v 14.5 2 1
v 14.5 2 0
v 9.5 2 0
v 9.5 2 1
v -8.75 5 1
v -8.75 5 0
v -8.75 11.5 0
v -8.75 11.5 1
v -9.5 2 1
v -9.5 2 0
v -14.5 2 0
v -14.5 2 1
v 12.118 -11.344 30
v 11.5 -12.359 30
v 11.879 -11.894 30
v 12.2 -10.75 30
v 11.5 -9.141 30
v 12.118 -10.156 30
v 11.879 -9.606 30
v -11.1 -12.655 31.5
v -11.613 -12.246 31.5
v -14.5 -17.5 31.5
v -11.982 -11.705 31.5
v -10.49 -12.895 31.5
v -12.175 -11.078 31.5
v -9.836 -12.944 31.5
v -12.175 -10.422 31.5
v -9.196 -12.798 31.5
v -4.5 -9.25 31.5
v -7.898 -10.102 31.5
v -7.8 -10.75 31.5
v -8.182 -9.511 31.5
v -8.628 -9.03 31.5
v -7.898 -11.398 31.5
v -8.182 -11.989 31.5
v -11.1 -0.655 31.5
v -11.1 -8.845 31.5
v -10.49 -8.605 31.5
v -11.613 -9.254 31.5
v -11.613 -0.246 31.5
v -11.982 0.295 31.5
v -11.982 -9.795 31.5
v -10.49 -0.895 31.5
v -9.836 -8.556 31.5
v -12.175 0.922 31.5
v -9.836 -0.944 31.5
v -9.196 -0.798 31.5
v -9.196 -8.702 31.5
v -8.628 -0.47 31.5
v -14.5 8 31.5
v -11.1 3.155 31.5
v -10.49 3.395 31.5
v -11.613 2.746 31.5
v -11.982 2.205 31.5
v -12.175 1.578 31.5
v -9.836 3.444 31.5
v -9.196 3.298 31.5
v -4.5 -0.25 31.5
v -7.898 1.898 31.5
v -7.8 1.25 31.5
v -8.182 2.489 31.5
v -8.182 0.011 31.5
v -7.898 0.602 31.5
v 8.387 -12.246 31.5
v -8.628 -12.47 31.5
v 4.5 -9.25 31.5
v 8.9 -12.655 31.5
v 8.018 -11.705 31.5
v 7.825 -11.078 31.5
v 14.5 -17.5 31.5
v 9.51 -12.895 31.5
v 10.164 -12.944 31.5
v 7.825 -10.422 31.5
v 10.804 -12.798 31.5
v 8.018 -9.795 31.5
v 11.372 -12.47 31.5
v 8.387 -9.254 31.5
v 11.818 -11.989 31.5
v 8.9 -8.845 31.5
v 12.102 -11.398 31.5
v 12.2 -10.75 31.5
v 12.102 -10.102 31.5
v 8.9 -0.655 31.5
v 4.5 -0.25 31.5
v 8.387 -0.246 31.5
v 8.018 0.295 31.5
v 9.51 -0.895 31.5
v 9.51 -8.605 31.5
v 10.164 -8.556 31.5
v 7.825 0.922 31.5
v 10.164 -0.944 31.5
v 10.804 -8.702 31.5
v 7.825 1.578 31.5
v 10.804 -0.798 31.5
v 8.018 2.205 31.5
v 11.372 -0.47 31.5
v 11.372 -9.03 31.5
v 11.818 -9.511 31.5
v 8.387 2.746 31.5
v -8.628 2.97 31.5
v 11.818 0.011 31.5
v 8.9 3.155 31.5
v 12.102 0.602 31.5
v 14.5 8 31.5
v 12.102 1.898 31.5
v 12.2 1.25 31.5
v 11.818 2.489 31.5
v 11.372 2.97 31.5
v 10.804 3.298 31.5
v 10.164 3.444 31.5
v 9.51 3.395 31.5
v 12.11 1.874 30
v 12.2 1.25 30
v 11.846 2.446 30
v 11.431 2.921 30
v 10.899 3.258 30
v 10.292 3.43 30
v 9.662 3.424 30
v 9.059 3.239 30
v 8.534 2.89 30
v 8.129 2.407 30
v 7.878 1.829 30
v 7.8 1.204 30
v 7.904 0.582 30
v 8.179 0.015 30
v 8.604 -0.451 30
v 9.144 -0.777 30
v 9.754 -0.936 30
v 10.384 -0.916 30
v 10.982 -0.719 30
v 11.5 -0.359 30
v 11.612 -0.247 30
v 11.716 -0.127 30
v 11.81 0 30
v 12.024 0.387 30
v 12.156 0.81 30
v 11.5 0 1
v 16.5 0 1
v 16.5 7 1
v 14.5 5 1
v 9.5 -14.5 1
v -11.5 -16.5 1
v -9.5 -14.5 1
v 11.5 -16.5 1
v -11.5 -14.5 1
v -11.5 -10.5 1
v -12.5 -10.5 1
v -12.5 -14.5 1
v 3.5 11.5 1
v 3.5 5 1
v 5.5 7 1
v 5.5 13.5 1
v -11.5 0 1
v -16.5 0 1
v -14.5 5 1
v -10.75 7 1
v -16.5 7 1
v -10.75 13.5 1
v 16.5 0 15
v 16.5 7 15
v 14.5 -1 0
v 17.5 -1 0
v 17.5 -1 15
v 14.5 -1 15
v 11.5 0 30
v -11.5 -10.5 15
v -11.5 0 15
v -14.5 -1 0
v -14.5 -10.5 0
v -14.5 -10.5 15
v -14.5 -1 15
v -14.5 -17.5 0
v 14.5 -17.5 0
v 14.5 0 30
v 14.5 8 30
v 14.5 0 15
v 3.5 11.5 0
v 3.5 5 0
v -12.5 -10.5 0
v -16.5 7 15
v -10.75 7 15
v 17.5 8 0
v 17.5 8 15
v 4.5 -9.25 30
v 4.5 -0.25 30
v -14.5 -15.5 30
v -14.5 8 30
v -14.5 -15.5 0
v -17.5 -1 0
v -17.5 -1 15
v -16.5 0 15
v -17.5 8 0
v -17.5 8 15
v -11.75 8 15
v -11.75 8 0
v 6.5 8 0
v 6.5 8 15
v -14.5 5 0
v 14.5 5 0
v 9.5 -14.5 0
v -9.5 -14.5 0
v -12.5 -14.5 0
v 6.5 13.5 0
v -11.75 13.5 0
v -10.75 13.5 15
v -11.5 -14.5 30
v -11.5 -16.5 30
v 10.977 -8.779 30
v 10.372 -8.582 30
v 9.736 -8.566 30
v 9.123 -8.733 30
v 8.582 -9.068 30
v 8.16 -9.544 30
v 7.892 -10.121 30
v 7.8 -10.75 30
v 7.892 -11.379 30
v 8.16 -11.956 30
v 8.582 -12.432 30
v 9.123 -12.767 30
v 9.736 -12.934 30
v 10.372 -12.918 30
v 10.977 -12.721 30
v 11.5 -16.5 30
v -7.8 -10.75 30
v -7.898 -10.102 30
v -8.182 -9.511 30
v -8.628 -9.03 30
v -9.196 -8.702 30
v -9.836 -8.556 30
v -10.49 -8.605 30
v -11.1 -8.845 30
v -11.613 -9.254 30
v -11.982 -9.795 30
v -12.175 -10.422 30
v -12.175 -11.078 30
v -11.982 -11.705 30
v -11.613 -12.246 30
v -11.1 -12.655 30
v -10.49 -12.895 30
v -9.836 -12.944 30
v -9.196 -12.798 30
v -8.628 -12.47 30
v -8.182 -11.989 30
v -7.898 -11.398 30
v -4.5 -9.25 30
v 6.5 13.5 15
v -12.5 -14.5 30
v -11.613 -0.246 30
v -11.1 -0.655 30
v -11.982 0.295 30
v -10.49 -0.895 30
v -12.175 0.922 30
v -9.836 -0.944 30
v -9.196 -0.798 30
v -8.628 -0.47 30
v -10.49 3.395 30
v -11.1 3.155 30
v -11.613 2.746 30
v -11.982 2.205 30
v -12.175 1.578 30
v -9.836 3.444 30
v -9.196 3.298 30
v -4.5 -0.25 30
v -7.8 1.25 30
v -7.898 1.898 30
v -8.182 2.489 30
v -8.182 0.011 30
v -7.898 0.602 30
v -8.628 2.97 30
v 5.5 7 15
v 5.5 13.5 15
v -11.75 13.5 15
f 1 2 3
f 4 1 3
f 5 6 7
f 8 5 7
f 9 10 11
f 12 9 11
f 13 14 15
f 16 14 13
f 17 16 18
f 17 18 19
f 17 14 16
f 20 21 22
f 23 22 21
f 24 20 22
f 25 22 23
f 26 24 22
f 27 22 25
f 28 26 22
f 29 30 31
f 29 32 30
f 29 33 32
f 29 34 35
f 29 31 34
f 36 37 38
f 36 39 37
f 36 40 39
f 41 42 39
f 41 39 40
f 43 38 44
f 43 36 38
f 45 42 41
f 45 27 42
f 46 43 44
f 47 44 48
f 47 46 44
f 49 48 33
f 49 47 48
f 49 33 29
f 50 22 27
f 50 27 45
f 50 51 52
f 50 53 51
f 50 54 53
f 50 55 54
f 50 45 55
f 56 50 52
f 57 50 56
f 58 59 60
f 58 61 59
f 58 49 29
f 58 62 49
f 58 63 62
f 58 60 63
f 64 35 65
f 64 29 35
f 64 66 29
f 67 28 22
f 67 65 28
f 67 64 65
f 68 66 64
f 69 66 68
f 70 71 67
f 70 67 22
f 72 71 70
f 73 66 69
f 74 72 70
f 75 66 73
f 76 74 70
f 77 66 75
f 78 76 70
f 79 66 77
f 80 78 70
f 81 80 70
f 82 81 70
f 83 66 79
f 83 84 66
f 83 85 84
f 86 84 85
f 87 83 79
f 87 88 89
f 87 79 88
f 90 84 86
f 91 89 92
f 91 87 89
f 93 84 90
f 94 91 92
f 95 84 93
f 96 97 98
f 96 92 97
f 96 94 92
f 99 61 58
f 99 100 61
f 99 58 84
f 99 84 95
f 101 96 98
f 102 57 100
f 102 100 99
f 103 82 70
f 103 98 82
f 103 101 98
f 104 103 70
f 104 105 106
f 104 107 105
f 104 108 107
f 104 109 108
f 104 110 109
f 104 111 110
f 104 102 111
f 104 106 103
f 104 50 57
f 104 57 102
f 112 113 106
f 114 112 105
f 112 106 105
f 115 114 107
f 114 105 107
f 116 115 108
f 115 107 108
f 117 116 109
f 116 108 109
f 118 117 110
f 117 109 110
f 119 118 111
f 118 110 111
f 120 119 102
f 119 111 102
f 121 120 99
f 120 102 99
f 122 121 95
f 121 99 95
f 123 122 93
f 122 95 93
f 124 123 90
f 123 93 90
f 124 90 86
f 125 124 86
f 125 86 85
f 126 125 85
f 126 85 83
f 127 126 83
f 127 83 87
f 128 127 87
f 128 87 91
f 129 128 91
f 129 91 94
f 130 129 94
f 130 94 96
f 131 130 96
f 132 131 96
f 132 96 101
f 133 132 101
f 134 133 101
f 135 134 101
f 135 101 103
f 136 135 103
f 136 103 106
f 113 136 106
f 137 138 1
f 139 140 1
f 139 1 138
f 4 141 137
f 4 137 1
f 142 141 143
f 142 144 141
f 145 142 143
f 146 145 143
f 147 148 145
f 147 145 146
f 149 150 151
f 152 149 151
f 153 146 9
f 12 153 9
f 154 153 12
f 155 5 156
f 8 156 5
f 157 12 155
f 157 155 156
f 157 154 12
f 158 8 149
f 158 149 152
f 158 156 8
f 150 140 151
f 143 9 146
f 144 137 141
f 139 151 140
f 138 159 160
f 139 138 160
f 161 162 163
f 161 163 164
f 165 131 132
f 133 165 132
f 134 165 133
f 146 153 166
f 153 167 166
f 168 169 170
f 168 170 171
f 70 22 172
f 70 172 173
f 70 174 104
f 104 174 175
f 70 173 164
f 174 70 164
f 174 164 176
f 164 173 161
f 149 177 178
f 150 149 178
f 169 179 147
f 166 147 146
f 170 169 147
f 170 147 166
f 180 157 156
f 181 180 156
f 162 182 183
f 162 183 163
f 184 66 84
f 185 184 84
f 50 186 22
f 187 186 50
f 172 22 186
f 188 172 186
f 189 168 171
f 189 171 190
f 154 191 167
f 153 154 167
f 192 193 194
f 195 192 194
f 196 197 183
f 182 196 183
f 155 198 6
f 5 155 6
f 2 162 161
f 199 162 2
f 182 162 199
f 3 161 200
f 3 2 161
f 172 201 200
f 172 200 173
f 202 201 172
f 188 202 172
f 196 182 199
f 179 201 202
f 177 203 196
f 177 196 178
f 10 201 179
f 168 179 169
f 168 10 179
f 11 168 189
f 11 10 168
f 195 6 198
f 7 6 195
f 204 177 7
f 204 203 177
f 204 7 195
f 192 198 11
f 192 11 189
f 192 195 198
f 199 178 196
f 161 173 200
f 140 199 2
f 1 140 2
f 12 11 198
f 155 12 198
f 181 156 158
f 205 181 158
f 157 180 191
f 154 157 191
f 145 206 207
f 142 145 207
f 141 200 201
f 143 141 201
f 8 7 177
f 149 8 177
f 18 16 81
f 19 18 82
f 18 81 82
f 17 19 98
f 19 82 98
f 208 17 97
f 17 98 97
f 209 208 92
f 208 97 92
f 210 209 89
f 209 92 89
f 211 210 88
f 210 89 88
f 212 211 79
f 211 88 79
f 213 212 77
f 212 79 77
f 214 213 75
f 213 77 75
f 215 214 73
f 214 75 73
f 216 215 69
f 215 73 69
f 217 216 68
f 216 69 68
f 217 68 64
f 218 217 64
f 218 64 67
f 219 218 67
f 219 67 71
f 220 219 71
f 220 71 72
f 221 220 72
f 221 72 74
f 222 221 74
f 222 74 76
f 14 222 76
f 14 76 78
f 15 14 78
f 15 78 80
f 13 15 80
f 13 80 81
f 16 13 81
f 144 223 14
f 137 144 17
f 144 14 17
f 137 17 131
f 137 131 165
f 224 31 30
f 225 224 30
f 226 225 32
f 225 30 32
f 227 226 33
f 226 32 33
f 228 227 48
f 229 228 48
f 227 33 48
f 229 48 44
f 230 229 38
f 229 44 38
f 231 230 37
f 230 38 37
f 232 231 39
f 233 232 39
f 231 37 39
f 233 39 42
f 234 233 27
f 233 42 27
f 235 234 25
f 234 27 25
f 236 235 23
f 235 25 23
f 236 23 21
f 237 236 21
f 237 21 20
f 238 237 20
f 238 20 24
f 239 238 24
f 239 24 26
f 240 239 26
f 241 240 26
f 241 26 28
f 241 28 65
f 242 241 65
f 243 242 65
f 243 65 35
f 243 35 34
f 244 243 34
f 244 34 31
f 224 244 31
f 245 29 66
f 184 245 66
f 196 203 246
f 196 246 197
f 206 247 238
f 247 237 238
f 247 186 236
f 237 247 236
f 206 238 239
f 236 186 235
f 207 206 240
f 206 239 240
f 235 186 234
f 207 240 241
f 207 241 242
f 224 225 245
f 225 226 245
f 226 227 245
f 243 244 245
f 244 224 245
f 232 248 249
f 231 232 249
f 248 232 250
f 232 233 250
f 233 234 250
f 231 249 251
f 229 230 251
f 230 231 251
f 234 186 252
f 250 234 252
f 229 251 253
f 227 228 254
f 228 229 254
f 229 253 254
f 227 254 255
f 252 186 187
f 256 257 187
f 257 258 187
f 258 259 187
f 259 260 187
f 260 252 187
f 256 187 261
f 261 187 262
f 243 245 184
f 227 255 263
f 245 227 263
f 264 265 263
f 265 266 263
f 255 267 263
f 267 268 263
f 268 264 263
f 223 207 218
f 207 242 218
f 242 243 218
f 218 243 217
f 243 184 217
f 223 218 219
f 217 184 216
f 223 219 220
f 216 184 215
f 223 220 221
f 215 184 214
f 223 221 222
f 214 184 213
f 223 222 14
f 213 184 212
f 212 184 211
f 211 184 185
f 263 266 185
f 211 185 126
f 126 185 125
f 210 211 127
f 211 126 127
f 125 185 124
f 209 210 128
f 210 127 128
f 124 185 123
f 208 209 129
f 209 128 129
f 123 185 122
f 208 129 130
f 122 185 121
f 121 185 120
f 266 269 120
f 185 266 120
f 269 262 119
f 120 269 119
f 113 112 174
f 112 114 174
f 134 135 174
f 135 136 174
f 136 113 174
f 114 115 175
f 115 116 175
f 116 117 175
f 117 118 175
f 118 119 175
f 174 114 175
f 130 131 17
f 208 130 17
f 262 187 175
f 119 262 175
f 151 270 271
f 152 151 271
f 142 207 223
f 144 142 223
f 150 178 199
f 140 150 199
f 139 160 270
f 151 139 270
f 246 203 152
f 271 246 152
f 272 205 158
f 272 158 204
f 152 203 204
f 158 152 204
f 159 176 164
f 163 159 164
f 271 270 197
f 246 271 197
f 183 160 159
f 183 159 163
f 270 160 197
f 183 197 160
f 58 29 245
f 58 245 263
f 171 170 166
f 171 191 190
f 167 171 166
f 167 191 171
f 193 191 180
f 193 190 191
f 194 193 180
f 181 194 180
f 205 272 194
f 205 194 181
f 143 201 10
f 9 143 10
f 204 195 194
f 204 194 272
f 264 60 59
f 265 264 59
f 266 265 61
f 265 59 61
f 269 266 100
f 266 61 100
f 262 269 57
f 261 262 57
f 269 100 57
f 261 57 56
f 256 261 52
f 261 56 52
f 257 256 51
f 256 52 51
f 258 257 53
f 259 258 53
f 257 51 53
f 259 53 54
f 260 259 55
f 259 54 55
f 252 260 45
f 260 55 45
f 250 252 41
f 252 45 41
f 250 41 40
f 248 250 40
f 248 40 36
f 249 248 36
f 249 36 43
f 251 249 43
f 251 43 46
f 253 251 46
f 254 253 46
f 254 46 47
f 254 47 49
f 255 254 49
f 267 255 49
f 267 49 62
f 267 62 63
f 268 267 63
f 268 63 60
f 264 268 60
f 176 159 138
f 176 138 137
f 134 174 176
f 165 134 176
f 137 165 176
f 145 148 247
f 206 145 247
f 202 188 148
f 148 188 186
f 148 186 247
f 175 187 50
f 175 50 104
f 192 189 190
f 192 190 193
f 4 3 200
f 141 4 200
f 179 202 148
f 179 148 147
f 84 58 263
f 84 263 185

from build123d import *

# Parameters (mm, degrees)
EXTRUDE_1_DEPTH        = 15
CUT_EXTRUDE_1_DEPTH    = 14
SKETCH_7_W             = 46
SKETCH_7_H             = 6
CUT_EXTRUDE_2_DEPTH    = 1
SKETCH_8_W             = 14
SKETCH_8_H             = 4
CUT_EXTRUDE_3_DEPTH    = 1
CUT_EXTRUDE_6_DEPTH    = 1
EXTRUDE_START          = -30
EXTRUDE_10_OUTLINE_W   = 3
EXTRUDE_10_OUTLINE_H   = 17.5
EXTRUDE_10_OUTLINE_H_2 = 10.5
EXTRUDE_10_OUTLINE_W_2 = 9
EXTRUDE_10_OUTLINE_H_3 = 1
EXTRUDE_10_OUTLINE_W_3 = 2
EXTRUDE_10_DEPTH       = 30
SKETCH_29_W            = 29
SKETCH_29_H            = 25.5
EXTRUDE_12_DEPTH       = 1.5
SKETCH_30_R            = 2.2
SKETCH_30_W            = 9
SKETCH_30_H            = 9
CUT_EXTRUDE_8_DEPTH    = 1.5
SKETCH_31_W            = 1.75
SKETCH_31_H            = 1
EXTRUDE_13_DEPTH       = 15
SKETCH_33_W            = 9
SKETCH_33_H            = 1
SKETCH_33_W_2          = 3.75
CUT_EXTRUDE_9_DEPTH    = 15
SKETCH_38_W            = 3
SKETCH_38_H            = 10.5
CUT_EXTRUDE_11_DEPTH   = 15
SKETCH_39_W            = 29
SKETCH_39_H            = 1
EXTRUDE_14_DEPTH       = 30
SKETCH_40_W            = 48
SKETCH_40_H            = 8
CUT_EXTRUDE_12_DEPTH   = 15


# Read off the part's stored shape, not the designer's step: 凸台-拉伸10
with BuildPart() as part:
    # 草图3 → 凸台-拉伸1 (new body)
    with BuildSketch(Plane.XY):
        Polygon((-25, 21.5), (23, 21.5), (23, 13.5), (6.5, 13.5), (6.5, 8), (17.5, 8), (17.5, -1), (12.5, -1), (12.5, -17.5), (-12.5, -17.5), (-12.5, -1), (-17.5, -1), (-17.5, 8), (-11.75, 8), (-11.75, 13.5), (-25, 13.5), align=None)
    extrude(amount=EXTRUDE_1_DEPTH)

    # 草图4 → 切除-拉伸1 (cut)
    with BuildSketch(Plane.XY.offset(15)):
        Polygon((22, 20.5), (-24, 20.5), (-24, 14.5), (-10.75, 14.5), (-10.75, 7), (-16.5, 7), (-16.5, 0), (-11.5, 0), (-11.5, -16.5), (11.5, -16.5), (11.5, 0), (16.5, 0), (16.5, 7), (5.5, 7), (5.5, 14.5), (22, 14.5), align=None)
    extrude(amount=-CUT_EXTRUDE_1_DEPTH, mode=Mode.SUBTRACT)

    # 草图7 → 切除-拉伸2 (cut)
    with BuildSketch(Plane.XY.offset(1)):
        with Locations((-1, 17.5)):
            Rectangle(SKETCH_7_W, SKETCH_7_H)
    extrude(amount=-CUT_EXTRUDE_2_DEPTH, mode=Mode.SUBTRACT)

    # 草图8 → 切除-拉伸3 (cut)
    with BuildSketch(Plane.ZY.offset(12.5)):
        with Locations((8, -12.5)):
            Rectangle(SKETCH_8_W, SKETCH_8_H)
    extrude(amount=-CUT_EXTRUDE_3_DEPTH, mode=Mode.SUBTRACT)

    # 草图9 → 切除-拉伸6 (cut)
    with BuildSketch(Plane(origin=(0, 0, 0), x_dir=(-1, 0, 0), z_dir=(0, 0, -1))):
        Polygon((-3.5, 11.5), (-3.5, 5), (-14.5, 5), (-14.5, 2), (-9.5, 2), (-9.5, -14.5), (9.5, -14.5), (9.5, 2), (14.5, 2), (14.5, 5), (8.75, 5), (8.75, 11.5), align=None)
    extrude(amount=-CUT_EXTRUDE_6_DEPTH, mode=Mode.SUBTRACT)

    # 凸台-拉伸10 outline → 凸台-拉伸10 (add)
    with BuildSketch(Plane(origin=(0, 0, 0), x_dir=(-1, 0, 0), z_dir=(0, 0, -1)).offset(EXTRUDE_START)):
        with Locations((-13, -8.75)):
            Rectangle(EXTRUDE_10_OUTLINE_W, EXTRUDE_10_OUTLINE_H)
        Polygon((14.5, -15.5), (12.5, -14.5), (11.5, -14.5), (11.5, -17.5), (14.5, -17.5), align=None)
        with Locations((13, -5.25)):
            Rectangle(EXTRUDE_10_OUTLINE_W, EXTRUDE_10_OUTLINE_H_2)
        with Locations((-10, 7.5)):
            Rectangle(EXTRUDE_10_OUTLINE_W_2, EXTRUDE_10_OUTLINE_H_3)
        with Locations((13.5, 7.5)):
            Rectangle(EXTRUDE_10_OUTLINE_W_3, EXTRUDE_10_OUTLINE_H_3)
    extrude(amount=EXTRUDE_10_DEPTH)

    # 草图29 → 凸台-拉伸12 (add)
    with BuildSketch(Plane.XY.offset(30)):
        with Locations((0, -4.75)):
            Rectangle(SKETCH_29_W, SKETCH_29_H)
    extrude(amount=EXTRUDE_12_DEPTH)

    # 草图30 → 切除-拉伸8 (cut)
    with BuildSketch(Plane.XY.offset(31.5)):
        with Locations((-10, 1.25)):
            Circle(SKETCH_30_R)
        with Locations((-10, -10.75)):
            Circle(SKETCH_30_R)
        with Locations((10, 1.25)):
            Circle(SKETCH_30_R)
        with Locations((10, -10.75)):
            Circle(SKETCH_30_R)
        with Locations((0, -4.75)):
            Rectangle(SKETCH_30_W, SKETCH_30_H)
    extrude(amount=-CUT_EXTRUDE_8_DEPTH, mode=Mode.SUBTRACT)

    # 草图31 → 凸台-拉伸13 (add)
    with BuildSketch(Plane.XY.offset(15)):
        with Locations((-11.625, 7.5)):
            Rectangle(SKETCH_31_W, SKETCH_31_H)
    extrude(amount=EXTRUDE_13_DEPTH)

    # 草图33 → 切除-拉伸9 (cut)
    with BuildSketch(Plane.XY.offset(15)):
        with Locations((10, 7.5)):
            Rectangle(SKETCH_33_W, SKETCH_33_H)
        with Locations((-12.625, 7.5)):
            Rectangle(SKETCH_33_W_2, SKETCH_33_H)
    extrude(amount=CUT_EXTRUDE_9_DEPTH, mode=Mode.SUBTRACT)

    # 草图38 → 切除-拉伸11 (cut)
    with BuildSketch(Plane.XY.offset(15)):
        with Locations((-13, -5.25)):
            Rectangle(SKETCH_38_W, SKETCH_38_H)
    extrude(amount=CUT_EXTRUDE_11_DEPTH, mode=Mode.SUBTRACT)

    # 草图39 → 凸台-拉伸14 (add)
    with BuildSketch(Plane(origin=(0, 0, 0), x_dir=(-1, 0, 0), z_dir=(0, 0, -1))):
        with Locations((0, -17)):
            Rectangle(SKETCH_39_W, SKETCH_39_H)
    extrude(amount=-EXTRUDE_14_DEPTH)

    # 草图40 → 切除-拉伸12 (cut)
    with BuildSketch(Plane(origin=(0, 0, 0), x_dir=(-1, 0, 0), z_dir=(0, 0, -1))):
        with Locations((1, 17.5)):
            Rectangle(SKETCH_40_W, SKETCH_40_H)
    extrude(amount=-CUT_EXTRUDE_12_DEPTH, mode=Mode.SUBTRACT)


solid = part.part
